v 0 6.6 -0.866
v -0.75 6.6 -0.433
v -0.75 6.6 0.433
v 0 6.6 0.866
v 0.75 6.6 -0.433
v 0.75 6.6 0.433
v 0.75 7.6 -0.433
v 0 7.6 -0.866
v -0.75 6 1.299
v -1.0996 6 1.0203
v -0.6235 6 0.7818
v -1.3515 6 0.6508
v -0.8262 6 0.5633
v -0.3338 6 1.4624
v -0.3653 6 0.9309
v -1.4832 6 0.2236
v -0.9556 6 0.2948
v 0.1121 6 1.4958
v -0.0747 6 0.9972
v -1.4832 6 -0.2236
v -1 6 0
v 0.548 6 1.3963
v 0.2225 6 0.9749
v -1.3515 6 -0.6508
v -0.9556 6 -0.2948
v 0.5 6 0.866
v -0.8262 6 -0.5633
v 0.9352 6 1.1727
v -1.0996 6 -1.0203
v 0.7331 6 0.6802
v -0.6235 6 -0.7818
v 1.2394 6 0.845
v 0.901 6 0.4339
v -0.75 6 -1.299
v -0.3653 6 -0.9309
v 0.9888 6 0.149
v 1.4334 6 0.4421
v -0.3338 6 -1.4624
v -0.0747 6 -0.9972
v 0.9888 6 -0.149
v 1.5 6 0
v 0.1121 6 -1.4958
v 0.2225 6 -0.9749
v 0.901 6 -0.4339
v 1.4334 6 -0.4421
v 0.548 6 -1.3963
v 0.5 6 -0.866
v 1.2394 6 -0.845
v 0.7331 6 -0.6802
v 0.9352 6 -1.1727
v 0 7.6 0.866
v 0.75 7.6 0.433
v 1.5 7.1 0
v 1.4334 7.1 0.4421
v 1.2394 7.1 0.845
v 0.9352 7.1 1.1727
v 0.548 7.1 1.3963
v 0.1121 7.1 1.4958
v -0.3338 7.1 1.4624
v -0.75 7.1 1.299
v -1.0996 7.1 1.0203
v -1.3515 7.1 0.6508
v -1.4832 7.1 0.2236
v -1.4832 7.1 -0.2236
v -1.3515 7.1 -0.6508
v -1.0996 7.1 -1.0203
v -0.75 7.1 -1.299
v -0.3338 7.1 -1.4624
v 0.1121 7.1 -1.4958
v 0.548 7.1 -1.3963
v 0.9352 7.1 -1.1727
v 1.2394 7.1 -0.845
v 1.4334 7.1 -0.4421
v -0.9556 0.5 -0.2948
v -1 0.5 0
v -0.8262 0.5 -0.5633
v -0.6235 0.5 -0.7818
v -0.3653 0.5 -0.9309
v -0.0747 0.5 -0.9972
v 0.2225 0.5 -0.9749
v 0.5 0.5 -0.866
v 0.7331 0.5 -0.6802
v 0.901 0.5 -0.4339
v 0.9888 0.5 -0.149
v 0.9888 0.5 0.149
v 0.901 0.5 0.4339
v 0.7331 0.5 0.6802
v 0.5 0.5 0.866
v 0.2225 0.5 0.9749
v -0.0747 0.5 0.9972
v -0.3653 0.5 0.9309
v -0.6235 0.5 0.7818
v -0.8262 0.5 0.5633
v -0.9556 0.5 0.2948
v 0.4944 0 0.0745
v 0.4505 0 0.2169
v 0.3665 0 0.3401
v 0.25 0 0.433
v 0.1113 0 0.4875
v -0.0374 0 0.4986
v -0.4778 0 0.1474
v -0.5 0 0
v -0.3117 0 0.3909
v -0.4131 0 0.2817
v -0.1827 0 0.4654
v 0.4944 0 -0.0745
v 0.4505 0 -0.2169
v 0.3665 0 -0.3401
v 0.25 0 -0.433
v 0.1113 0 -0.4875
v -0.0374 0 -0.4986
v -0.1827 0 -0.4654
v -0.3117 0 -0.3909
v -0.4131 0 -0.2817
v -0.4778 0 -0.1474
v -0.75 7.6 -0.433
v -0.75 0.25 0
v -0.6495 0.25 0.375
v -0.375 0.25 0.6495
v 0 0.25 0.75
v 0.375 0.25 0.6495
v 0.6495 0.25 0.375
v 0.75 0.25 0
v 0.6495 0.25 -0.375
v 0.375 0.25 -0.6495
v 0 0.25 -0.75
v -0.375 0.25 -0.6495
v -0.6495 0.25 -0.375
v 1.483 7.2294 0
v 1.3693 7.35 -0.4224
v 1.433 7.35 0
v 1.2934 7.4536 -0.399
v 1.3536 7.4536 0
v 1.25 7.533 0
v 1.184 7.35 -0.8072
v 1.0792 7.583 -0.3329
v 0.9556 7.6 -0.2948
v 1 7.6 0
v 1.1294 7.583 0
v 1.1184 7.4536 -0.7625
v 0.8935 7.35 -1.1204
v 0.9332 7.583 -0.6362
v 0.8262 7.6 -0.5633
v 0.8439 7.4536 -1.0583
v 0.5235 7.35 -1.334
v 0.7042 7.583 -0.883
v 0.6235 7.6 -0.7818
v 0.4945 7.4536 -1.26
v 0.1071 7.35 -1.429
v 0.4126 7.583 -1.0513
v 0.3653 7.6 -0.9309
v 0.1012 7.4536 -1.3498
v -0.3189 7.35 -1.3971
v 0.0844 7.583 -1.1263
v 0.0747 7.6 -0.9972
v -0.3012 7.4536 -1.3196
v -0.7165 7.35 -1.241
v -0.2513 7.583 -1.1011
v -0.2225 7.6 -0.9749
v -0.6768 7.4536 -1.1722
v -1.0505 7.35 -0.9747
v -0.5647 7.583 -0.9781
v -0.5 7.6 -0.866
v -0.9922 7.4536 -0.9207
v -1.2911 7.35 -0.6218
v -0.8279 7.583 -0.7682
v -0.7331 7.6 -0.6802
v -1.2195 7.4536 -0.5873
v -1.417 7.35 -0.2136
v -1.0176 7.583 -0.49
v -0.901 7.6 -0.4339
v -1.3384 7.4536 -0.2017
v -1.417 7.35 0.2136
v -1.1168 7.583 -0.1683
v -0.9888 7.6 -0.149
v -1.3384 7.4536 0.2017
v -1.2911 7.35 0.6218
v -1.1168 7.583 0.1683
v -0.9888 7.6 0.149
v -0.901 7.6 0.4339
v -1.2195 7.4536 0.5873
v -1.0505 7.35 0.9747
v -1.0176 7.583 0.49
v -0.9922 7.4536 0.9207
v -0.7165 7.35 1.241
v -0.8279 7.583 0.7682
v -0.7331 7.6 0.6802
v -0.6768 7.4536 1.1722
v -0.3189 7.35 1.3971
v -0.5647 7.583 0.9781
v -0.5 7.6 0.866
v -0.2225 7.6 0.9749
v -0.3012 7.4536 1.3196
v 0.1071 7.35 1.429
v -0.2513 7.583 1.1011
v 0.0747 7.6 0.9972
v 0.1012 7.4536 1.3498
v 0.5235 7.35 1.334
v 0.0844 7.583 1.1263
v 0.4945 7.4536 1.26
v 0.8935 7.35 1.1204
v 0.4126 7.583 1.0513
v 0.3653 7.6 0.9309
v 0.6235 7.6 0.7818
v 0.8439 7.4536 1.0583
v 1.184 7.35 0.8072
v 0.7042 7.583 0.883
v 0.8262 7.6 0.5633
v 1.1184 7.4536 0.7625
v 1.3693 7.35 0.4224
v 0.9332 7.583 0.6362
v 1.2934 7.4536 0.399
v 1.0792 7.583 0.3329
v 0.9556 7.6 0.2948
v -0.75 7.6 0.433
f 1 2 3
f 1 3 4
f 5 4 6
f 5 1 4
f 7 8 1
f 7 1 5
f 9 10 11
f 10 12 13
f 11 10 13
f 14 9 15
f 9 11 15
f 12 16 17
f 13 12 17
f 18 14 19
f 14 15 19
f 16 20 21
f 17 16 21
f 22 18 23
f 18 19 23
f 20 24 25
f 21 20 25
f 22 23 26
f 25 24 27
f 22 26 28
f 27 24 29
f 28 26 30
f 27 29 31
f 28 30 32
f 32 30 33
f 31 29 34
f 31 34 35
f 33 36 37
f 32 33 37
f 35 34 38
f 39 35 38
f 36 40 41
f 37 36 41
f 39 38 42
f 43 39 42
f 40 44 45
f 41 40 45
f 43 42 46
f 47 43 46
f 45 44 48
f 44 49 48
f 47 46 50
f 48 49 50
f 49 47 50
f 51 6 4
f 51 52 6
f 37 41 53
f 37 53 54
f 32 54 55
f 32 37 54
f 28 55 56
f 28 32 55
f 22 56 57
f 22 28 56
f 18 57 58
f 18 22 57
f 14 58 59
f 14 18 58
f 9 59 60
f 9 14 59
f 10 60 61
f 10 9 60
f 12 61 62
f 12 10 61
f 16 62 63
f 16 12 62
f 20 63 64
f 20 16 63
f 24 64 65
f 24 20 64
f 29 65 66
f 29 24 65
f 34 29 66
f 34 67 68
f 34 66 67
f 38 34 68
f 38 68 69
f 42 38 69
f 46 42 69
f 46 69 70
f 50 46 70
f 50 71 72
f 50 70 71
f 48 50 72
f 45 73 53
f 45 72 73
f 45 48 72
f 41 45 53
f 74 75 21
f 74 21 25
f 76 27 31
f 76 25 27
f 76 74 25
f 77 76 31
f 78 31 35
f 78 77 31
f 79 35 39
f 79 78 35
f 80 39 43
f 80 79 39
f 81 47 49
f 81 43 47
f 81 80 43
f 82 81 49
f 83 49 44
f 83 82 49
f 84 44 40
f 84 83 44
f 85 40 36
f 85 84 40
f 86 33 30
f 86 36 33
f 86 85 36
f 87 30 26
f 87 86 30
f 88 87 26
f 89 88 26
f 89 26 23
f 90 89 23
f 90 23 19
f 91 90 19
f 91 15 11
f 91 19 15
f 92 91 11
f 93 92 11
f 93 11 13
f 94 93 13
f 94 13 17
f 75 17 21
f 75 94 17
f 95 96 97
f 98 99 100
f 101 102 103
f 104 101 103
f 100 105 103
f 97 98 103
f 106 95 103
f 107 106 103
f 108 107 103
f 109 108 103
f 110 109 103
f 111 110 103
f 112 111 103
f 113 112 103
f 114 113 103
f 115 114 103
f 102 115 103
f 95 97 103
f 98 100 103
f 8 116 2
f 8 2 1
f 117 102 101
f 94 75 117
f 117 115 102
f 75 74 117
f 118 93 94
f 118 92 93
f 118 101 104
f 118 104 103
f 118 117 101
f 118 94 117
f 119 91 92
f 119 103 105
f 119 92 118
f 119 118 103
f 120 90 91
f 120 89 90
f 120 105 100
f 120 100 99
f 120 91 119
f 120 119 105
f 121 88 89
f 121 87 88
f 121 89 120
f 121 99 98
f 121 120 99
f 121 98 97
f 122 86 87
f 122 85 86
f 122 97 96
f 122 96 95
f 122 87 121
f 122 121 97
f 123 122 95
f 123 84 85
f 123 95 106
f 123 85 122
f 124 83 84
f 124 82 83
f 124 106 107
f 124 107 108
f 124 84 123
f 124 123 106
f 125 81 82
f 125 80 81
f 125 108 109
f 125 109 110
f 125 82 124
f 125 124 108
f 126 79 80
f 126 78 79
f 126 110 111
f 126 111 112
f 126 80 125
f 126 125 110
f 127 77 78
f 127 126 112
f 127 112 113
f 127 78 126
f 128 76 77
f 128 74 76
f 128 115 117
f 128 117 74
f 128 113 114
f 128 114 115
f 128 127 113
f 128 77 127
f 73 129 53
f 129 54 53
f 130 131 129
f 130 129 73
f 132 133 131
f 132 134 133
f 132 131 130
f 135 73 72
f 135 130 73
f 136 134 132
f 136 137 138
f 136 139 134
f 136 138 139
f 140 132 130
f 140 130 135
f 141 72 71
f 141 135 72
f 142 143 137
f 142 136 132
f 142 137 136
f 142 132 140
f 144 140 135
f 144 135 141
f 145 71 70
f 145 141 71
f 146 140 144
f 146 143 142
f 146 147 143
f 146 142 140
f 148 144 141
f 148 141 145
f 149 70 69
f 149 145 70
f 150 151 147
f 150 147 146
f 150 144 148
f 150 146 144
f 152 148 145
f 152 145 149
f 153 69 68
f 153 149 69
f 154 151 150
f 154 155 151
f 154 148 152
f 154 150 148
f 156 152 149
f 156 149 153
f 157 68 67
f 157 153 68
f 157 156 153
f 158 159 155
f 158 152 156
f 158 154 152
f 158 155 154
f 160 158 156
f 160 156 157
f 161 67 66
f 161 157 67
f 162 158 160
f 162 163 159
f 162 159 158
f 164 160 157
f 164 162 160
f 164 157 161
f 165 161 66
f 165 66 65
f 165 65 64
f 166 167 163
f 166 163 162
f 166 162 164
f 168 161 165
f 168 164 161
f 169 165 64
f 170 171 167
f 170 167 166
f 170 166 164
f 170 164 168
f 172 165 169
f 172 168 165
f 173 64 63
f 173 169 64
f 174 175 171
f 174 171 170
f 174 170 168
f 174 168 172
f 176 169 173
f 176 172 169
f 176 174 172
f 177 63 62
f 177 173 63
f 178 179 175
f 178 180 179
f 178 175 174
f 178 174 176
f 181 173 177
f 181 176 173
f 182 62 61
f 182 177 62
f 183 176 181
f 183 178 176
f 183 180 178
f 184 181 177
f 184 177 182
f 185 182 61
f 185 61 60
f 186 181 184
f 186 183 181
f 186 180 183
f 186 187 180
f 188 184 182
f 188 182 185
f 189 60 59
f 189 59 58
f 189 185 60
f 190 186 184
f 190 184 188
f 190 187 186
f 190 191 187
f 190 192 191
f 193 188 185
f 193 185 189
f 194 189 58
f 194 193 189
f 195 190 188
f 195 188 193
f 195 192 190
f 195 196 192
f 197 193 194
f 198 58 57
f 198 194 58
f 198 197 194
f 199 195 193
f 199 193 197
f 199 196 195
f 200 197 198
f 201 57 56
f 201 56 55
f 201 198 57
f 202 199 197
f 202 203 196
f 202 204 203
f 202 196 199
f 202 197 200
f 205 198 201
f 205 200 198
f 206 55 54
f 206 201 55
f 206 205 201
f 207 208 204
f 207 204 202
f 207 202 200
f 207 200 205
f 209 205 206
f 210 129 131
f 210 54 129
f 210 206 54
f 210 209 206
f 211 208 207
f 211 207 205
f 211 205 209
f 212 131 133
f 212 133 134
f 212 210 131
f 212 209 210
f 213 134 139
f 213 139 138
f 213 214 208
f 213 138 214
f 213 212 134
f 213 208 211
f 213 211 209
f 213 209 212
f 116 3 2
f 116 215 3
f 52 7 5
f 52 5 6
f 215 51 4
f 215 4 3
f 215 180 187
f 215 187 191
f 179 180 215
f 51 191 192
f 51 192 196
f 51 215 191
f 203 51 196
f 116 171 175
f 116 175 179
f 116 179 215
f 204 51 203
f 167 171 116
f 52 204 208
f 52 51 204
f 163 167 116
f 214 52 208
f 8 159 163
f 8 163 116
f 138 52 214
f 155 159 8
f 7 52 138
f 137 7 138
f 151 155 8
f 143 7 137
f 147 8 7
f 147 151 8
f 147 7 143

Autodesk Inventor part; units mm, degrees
ref_plane "YZ Plane" through (0, 0, 0) normal (1, 0, 0) x (0, 1, 0)
sketch "Sketch1" plane through (0, 0, 0) normal (0, 1, 0) x (-1, 0, 0)
  circle A0 centre (0, 0) radius 1
  dimension "d0" = 2
extrude "Extrusion1" add sketch "Sketch1" along normal blind 6
chamfer "Chamfer1" distance 0.5 angle 45 1 edges at (1, 0, 0)
ref_plane "Work Plane1" through (0, 6, 0) normal (0, 1, 0) x (1, 0, 0)
sketch "Sketch2" plane through (0, 6, 0) normal (0, 1, 0) x (1, 0, 0)
  circle A0 centre (0, 0) radius 0.5
  circle A1 centre (0, 0) radius 1.5
  dimension "d7" = 3
extrude "Extrusion2" add sketch "Sketch2" along normal blind 1.6 contours A0 | A1
fillet "Fillet1" radius 0.5 1 edges at (-1.5, 7.6, 0)
ref_plane "Work Plane2" through (0, 7.6, 0) normal (0, 1, 0) x (1, 0, 0)
sketch "Sketch3" plane through (0, 7.6, 0) normal (0, 1, 0) x (1, 0, 0)
  line L0 (-0.75, 0.433) -> (0, 0.866)
  line L1 (0, 0.866) -> (0.75, 0.433)
  line L2 (0.75, 0.433) -> (0.75, -0.433)
  line L3 (0.75, -0.433) -> (0, -0.866)
  line L4 (0, -0.866) -> (-0.75, -0.433)
  line L5 (-0.75, -0.433) -> (-0.75, 0.433)
  point P0 (0, 0)
  point P1 (0, 0)
  dimension "d12" = 0.75
extrude "Extrusion3" cut sketch "Sketch3" against normal blind 1
thread "Thread1" size "M2x0.4" class "6g" standard "ANSI Metric M Profile" full length
properties part number "M2x6mm_screw"
